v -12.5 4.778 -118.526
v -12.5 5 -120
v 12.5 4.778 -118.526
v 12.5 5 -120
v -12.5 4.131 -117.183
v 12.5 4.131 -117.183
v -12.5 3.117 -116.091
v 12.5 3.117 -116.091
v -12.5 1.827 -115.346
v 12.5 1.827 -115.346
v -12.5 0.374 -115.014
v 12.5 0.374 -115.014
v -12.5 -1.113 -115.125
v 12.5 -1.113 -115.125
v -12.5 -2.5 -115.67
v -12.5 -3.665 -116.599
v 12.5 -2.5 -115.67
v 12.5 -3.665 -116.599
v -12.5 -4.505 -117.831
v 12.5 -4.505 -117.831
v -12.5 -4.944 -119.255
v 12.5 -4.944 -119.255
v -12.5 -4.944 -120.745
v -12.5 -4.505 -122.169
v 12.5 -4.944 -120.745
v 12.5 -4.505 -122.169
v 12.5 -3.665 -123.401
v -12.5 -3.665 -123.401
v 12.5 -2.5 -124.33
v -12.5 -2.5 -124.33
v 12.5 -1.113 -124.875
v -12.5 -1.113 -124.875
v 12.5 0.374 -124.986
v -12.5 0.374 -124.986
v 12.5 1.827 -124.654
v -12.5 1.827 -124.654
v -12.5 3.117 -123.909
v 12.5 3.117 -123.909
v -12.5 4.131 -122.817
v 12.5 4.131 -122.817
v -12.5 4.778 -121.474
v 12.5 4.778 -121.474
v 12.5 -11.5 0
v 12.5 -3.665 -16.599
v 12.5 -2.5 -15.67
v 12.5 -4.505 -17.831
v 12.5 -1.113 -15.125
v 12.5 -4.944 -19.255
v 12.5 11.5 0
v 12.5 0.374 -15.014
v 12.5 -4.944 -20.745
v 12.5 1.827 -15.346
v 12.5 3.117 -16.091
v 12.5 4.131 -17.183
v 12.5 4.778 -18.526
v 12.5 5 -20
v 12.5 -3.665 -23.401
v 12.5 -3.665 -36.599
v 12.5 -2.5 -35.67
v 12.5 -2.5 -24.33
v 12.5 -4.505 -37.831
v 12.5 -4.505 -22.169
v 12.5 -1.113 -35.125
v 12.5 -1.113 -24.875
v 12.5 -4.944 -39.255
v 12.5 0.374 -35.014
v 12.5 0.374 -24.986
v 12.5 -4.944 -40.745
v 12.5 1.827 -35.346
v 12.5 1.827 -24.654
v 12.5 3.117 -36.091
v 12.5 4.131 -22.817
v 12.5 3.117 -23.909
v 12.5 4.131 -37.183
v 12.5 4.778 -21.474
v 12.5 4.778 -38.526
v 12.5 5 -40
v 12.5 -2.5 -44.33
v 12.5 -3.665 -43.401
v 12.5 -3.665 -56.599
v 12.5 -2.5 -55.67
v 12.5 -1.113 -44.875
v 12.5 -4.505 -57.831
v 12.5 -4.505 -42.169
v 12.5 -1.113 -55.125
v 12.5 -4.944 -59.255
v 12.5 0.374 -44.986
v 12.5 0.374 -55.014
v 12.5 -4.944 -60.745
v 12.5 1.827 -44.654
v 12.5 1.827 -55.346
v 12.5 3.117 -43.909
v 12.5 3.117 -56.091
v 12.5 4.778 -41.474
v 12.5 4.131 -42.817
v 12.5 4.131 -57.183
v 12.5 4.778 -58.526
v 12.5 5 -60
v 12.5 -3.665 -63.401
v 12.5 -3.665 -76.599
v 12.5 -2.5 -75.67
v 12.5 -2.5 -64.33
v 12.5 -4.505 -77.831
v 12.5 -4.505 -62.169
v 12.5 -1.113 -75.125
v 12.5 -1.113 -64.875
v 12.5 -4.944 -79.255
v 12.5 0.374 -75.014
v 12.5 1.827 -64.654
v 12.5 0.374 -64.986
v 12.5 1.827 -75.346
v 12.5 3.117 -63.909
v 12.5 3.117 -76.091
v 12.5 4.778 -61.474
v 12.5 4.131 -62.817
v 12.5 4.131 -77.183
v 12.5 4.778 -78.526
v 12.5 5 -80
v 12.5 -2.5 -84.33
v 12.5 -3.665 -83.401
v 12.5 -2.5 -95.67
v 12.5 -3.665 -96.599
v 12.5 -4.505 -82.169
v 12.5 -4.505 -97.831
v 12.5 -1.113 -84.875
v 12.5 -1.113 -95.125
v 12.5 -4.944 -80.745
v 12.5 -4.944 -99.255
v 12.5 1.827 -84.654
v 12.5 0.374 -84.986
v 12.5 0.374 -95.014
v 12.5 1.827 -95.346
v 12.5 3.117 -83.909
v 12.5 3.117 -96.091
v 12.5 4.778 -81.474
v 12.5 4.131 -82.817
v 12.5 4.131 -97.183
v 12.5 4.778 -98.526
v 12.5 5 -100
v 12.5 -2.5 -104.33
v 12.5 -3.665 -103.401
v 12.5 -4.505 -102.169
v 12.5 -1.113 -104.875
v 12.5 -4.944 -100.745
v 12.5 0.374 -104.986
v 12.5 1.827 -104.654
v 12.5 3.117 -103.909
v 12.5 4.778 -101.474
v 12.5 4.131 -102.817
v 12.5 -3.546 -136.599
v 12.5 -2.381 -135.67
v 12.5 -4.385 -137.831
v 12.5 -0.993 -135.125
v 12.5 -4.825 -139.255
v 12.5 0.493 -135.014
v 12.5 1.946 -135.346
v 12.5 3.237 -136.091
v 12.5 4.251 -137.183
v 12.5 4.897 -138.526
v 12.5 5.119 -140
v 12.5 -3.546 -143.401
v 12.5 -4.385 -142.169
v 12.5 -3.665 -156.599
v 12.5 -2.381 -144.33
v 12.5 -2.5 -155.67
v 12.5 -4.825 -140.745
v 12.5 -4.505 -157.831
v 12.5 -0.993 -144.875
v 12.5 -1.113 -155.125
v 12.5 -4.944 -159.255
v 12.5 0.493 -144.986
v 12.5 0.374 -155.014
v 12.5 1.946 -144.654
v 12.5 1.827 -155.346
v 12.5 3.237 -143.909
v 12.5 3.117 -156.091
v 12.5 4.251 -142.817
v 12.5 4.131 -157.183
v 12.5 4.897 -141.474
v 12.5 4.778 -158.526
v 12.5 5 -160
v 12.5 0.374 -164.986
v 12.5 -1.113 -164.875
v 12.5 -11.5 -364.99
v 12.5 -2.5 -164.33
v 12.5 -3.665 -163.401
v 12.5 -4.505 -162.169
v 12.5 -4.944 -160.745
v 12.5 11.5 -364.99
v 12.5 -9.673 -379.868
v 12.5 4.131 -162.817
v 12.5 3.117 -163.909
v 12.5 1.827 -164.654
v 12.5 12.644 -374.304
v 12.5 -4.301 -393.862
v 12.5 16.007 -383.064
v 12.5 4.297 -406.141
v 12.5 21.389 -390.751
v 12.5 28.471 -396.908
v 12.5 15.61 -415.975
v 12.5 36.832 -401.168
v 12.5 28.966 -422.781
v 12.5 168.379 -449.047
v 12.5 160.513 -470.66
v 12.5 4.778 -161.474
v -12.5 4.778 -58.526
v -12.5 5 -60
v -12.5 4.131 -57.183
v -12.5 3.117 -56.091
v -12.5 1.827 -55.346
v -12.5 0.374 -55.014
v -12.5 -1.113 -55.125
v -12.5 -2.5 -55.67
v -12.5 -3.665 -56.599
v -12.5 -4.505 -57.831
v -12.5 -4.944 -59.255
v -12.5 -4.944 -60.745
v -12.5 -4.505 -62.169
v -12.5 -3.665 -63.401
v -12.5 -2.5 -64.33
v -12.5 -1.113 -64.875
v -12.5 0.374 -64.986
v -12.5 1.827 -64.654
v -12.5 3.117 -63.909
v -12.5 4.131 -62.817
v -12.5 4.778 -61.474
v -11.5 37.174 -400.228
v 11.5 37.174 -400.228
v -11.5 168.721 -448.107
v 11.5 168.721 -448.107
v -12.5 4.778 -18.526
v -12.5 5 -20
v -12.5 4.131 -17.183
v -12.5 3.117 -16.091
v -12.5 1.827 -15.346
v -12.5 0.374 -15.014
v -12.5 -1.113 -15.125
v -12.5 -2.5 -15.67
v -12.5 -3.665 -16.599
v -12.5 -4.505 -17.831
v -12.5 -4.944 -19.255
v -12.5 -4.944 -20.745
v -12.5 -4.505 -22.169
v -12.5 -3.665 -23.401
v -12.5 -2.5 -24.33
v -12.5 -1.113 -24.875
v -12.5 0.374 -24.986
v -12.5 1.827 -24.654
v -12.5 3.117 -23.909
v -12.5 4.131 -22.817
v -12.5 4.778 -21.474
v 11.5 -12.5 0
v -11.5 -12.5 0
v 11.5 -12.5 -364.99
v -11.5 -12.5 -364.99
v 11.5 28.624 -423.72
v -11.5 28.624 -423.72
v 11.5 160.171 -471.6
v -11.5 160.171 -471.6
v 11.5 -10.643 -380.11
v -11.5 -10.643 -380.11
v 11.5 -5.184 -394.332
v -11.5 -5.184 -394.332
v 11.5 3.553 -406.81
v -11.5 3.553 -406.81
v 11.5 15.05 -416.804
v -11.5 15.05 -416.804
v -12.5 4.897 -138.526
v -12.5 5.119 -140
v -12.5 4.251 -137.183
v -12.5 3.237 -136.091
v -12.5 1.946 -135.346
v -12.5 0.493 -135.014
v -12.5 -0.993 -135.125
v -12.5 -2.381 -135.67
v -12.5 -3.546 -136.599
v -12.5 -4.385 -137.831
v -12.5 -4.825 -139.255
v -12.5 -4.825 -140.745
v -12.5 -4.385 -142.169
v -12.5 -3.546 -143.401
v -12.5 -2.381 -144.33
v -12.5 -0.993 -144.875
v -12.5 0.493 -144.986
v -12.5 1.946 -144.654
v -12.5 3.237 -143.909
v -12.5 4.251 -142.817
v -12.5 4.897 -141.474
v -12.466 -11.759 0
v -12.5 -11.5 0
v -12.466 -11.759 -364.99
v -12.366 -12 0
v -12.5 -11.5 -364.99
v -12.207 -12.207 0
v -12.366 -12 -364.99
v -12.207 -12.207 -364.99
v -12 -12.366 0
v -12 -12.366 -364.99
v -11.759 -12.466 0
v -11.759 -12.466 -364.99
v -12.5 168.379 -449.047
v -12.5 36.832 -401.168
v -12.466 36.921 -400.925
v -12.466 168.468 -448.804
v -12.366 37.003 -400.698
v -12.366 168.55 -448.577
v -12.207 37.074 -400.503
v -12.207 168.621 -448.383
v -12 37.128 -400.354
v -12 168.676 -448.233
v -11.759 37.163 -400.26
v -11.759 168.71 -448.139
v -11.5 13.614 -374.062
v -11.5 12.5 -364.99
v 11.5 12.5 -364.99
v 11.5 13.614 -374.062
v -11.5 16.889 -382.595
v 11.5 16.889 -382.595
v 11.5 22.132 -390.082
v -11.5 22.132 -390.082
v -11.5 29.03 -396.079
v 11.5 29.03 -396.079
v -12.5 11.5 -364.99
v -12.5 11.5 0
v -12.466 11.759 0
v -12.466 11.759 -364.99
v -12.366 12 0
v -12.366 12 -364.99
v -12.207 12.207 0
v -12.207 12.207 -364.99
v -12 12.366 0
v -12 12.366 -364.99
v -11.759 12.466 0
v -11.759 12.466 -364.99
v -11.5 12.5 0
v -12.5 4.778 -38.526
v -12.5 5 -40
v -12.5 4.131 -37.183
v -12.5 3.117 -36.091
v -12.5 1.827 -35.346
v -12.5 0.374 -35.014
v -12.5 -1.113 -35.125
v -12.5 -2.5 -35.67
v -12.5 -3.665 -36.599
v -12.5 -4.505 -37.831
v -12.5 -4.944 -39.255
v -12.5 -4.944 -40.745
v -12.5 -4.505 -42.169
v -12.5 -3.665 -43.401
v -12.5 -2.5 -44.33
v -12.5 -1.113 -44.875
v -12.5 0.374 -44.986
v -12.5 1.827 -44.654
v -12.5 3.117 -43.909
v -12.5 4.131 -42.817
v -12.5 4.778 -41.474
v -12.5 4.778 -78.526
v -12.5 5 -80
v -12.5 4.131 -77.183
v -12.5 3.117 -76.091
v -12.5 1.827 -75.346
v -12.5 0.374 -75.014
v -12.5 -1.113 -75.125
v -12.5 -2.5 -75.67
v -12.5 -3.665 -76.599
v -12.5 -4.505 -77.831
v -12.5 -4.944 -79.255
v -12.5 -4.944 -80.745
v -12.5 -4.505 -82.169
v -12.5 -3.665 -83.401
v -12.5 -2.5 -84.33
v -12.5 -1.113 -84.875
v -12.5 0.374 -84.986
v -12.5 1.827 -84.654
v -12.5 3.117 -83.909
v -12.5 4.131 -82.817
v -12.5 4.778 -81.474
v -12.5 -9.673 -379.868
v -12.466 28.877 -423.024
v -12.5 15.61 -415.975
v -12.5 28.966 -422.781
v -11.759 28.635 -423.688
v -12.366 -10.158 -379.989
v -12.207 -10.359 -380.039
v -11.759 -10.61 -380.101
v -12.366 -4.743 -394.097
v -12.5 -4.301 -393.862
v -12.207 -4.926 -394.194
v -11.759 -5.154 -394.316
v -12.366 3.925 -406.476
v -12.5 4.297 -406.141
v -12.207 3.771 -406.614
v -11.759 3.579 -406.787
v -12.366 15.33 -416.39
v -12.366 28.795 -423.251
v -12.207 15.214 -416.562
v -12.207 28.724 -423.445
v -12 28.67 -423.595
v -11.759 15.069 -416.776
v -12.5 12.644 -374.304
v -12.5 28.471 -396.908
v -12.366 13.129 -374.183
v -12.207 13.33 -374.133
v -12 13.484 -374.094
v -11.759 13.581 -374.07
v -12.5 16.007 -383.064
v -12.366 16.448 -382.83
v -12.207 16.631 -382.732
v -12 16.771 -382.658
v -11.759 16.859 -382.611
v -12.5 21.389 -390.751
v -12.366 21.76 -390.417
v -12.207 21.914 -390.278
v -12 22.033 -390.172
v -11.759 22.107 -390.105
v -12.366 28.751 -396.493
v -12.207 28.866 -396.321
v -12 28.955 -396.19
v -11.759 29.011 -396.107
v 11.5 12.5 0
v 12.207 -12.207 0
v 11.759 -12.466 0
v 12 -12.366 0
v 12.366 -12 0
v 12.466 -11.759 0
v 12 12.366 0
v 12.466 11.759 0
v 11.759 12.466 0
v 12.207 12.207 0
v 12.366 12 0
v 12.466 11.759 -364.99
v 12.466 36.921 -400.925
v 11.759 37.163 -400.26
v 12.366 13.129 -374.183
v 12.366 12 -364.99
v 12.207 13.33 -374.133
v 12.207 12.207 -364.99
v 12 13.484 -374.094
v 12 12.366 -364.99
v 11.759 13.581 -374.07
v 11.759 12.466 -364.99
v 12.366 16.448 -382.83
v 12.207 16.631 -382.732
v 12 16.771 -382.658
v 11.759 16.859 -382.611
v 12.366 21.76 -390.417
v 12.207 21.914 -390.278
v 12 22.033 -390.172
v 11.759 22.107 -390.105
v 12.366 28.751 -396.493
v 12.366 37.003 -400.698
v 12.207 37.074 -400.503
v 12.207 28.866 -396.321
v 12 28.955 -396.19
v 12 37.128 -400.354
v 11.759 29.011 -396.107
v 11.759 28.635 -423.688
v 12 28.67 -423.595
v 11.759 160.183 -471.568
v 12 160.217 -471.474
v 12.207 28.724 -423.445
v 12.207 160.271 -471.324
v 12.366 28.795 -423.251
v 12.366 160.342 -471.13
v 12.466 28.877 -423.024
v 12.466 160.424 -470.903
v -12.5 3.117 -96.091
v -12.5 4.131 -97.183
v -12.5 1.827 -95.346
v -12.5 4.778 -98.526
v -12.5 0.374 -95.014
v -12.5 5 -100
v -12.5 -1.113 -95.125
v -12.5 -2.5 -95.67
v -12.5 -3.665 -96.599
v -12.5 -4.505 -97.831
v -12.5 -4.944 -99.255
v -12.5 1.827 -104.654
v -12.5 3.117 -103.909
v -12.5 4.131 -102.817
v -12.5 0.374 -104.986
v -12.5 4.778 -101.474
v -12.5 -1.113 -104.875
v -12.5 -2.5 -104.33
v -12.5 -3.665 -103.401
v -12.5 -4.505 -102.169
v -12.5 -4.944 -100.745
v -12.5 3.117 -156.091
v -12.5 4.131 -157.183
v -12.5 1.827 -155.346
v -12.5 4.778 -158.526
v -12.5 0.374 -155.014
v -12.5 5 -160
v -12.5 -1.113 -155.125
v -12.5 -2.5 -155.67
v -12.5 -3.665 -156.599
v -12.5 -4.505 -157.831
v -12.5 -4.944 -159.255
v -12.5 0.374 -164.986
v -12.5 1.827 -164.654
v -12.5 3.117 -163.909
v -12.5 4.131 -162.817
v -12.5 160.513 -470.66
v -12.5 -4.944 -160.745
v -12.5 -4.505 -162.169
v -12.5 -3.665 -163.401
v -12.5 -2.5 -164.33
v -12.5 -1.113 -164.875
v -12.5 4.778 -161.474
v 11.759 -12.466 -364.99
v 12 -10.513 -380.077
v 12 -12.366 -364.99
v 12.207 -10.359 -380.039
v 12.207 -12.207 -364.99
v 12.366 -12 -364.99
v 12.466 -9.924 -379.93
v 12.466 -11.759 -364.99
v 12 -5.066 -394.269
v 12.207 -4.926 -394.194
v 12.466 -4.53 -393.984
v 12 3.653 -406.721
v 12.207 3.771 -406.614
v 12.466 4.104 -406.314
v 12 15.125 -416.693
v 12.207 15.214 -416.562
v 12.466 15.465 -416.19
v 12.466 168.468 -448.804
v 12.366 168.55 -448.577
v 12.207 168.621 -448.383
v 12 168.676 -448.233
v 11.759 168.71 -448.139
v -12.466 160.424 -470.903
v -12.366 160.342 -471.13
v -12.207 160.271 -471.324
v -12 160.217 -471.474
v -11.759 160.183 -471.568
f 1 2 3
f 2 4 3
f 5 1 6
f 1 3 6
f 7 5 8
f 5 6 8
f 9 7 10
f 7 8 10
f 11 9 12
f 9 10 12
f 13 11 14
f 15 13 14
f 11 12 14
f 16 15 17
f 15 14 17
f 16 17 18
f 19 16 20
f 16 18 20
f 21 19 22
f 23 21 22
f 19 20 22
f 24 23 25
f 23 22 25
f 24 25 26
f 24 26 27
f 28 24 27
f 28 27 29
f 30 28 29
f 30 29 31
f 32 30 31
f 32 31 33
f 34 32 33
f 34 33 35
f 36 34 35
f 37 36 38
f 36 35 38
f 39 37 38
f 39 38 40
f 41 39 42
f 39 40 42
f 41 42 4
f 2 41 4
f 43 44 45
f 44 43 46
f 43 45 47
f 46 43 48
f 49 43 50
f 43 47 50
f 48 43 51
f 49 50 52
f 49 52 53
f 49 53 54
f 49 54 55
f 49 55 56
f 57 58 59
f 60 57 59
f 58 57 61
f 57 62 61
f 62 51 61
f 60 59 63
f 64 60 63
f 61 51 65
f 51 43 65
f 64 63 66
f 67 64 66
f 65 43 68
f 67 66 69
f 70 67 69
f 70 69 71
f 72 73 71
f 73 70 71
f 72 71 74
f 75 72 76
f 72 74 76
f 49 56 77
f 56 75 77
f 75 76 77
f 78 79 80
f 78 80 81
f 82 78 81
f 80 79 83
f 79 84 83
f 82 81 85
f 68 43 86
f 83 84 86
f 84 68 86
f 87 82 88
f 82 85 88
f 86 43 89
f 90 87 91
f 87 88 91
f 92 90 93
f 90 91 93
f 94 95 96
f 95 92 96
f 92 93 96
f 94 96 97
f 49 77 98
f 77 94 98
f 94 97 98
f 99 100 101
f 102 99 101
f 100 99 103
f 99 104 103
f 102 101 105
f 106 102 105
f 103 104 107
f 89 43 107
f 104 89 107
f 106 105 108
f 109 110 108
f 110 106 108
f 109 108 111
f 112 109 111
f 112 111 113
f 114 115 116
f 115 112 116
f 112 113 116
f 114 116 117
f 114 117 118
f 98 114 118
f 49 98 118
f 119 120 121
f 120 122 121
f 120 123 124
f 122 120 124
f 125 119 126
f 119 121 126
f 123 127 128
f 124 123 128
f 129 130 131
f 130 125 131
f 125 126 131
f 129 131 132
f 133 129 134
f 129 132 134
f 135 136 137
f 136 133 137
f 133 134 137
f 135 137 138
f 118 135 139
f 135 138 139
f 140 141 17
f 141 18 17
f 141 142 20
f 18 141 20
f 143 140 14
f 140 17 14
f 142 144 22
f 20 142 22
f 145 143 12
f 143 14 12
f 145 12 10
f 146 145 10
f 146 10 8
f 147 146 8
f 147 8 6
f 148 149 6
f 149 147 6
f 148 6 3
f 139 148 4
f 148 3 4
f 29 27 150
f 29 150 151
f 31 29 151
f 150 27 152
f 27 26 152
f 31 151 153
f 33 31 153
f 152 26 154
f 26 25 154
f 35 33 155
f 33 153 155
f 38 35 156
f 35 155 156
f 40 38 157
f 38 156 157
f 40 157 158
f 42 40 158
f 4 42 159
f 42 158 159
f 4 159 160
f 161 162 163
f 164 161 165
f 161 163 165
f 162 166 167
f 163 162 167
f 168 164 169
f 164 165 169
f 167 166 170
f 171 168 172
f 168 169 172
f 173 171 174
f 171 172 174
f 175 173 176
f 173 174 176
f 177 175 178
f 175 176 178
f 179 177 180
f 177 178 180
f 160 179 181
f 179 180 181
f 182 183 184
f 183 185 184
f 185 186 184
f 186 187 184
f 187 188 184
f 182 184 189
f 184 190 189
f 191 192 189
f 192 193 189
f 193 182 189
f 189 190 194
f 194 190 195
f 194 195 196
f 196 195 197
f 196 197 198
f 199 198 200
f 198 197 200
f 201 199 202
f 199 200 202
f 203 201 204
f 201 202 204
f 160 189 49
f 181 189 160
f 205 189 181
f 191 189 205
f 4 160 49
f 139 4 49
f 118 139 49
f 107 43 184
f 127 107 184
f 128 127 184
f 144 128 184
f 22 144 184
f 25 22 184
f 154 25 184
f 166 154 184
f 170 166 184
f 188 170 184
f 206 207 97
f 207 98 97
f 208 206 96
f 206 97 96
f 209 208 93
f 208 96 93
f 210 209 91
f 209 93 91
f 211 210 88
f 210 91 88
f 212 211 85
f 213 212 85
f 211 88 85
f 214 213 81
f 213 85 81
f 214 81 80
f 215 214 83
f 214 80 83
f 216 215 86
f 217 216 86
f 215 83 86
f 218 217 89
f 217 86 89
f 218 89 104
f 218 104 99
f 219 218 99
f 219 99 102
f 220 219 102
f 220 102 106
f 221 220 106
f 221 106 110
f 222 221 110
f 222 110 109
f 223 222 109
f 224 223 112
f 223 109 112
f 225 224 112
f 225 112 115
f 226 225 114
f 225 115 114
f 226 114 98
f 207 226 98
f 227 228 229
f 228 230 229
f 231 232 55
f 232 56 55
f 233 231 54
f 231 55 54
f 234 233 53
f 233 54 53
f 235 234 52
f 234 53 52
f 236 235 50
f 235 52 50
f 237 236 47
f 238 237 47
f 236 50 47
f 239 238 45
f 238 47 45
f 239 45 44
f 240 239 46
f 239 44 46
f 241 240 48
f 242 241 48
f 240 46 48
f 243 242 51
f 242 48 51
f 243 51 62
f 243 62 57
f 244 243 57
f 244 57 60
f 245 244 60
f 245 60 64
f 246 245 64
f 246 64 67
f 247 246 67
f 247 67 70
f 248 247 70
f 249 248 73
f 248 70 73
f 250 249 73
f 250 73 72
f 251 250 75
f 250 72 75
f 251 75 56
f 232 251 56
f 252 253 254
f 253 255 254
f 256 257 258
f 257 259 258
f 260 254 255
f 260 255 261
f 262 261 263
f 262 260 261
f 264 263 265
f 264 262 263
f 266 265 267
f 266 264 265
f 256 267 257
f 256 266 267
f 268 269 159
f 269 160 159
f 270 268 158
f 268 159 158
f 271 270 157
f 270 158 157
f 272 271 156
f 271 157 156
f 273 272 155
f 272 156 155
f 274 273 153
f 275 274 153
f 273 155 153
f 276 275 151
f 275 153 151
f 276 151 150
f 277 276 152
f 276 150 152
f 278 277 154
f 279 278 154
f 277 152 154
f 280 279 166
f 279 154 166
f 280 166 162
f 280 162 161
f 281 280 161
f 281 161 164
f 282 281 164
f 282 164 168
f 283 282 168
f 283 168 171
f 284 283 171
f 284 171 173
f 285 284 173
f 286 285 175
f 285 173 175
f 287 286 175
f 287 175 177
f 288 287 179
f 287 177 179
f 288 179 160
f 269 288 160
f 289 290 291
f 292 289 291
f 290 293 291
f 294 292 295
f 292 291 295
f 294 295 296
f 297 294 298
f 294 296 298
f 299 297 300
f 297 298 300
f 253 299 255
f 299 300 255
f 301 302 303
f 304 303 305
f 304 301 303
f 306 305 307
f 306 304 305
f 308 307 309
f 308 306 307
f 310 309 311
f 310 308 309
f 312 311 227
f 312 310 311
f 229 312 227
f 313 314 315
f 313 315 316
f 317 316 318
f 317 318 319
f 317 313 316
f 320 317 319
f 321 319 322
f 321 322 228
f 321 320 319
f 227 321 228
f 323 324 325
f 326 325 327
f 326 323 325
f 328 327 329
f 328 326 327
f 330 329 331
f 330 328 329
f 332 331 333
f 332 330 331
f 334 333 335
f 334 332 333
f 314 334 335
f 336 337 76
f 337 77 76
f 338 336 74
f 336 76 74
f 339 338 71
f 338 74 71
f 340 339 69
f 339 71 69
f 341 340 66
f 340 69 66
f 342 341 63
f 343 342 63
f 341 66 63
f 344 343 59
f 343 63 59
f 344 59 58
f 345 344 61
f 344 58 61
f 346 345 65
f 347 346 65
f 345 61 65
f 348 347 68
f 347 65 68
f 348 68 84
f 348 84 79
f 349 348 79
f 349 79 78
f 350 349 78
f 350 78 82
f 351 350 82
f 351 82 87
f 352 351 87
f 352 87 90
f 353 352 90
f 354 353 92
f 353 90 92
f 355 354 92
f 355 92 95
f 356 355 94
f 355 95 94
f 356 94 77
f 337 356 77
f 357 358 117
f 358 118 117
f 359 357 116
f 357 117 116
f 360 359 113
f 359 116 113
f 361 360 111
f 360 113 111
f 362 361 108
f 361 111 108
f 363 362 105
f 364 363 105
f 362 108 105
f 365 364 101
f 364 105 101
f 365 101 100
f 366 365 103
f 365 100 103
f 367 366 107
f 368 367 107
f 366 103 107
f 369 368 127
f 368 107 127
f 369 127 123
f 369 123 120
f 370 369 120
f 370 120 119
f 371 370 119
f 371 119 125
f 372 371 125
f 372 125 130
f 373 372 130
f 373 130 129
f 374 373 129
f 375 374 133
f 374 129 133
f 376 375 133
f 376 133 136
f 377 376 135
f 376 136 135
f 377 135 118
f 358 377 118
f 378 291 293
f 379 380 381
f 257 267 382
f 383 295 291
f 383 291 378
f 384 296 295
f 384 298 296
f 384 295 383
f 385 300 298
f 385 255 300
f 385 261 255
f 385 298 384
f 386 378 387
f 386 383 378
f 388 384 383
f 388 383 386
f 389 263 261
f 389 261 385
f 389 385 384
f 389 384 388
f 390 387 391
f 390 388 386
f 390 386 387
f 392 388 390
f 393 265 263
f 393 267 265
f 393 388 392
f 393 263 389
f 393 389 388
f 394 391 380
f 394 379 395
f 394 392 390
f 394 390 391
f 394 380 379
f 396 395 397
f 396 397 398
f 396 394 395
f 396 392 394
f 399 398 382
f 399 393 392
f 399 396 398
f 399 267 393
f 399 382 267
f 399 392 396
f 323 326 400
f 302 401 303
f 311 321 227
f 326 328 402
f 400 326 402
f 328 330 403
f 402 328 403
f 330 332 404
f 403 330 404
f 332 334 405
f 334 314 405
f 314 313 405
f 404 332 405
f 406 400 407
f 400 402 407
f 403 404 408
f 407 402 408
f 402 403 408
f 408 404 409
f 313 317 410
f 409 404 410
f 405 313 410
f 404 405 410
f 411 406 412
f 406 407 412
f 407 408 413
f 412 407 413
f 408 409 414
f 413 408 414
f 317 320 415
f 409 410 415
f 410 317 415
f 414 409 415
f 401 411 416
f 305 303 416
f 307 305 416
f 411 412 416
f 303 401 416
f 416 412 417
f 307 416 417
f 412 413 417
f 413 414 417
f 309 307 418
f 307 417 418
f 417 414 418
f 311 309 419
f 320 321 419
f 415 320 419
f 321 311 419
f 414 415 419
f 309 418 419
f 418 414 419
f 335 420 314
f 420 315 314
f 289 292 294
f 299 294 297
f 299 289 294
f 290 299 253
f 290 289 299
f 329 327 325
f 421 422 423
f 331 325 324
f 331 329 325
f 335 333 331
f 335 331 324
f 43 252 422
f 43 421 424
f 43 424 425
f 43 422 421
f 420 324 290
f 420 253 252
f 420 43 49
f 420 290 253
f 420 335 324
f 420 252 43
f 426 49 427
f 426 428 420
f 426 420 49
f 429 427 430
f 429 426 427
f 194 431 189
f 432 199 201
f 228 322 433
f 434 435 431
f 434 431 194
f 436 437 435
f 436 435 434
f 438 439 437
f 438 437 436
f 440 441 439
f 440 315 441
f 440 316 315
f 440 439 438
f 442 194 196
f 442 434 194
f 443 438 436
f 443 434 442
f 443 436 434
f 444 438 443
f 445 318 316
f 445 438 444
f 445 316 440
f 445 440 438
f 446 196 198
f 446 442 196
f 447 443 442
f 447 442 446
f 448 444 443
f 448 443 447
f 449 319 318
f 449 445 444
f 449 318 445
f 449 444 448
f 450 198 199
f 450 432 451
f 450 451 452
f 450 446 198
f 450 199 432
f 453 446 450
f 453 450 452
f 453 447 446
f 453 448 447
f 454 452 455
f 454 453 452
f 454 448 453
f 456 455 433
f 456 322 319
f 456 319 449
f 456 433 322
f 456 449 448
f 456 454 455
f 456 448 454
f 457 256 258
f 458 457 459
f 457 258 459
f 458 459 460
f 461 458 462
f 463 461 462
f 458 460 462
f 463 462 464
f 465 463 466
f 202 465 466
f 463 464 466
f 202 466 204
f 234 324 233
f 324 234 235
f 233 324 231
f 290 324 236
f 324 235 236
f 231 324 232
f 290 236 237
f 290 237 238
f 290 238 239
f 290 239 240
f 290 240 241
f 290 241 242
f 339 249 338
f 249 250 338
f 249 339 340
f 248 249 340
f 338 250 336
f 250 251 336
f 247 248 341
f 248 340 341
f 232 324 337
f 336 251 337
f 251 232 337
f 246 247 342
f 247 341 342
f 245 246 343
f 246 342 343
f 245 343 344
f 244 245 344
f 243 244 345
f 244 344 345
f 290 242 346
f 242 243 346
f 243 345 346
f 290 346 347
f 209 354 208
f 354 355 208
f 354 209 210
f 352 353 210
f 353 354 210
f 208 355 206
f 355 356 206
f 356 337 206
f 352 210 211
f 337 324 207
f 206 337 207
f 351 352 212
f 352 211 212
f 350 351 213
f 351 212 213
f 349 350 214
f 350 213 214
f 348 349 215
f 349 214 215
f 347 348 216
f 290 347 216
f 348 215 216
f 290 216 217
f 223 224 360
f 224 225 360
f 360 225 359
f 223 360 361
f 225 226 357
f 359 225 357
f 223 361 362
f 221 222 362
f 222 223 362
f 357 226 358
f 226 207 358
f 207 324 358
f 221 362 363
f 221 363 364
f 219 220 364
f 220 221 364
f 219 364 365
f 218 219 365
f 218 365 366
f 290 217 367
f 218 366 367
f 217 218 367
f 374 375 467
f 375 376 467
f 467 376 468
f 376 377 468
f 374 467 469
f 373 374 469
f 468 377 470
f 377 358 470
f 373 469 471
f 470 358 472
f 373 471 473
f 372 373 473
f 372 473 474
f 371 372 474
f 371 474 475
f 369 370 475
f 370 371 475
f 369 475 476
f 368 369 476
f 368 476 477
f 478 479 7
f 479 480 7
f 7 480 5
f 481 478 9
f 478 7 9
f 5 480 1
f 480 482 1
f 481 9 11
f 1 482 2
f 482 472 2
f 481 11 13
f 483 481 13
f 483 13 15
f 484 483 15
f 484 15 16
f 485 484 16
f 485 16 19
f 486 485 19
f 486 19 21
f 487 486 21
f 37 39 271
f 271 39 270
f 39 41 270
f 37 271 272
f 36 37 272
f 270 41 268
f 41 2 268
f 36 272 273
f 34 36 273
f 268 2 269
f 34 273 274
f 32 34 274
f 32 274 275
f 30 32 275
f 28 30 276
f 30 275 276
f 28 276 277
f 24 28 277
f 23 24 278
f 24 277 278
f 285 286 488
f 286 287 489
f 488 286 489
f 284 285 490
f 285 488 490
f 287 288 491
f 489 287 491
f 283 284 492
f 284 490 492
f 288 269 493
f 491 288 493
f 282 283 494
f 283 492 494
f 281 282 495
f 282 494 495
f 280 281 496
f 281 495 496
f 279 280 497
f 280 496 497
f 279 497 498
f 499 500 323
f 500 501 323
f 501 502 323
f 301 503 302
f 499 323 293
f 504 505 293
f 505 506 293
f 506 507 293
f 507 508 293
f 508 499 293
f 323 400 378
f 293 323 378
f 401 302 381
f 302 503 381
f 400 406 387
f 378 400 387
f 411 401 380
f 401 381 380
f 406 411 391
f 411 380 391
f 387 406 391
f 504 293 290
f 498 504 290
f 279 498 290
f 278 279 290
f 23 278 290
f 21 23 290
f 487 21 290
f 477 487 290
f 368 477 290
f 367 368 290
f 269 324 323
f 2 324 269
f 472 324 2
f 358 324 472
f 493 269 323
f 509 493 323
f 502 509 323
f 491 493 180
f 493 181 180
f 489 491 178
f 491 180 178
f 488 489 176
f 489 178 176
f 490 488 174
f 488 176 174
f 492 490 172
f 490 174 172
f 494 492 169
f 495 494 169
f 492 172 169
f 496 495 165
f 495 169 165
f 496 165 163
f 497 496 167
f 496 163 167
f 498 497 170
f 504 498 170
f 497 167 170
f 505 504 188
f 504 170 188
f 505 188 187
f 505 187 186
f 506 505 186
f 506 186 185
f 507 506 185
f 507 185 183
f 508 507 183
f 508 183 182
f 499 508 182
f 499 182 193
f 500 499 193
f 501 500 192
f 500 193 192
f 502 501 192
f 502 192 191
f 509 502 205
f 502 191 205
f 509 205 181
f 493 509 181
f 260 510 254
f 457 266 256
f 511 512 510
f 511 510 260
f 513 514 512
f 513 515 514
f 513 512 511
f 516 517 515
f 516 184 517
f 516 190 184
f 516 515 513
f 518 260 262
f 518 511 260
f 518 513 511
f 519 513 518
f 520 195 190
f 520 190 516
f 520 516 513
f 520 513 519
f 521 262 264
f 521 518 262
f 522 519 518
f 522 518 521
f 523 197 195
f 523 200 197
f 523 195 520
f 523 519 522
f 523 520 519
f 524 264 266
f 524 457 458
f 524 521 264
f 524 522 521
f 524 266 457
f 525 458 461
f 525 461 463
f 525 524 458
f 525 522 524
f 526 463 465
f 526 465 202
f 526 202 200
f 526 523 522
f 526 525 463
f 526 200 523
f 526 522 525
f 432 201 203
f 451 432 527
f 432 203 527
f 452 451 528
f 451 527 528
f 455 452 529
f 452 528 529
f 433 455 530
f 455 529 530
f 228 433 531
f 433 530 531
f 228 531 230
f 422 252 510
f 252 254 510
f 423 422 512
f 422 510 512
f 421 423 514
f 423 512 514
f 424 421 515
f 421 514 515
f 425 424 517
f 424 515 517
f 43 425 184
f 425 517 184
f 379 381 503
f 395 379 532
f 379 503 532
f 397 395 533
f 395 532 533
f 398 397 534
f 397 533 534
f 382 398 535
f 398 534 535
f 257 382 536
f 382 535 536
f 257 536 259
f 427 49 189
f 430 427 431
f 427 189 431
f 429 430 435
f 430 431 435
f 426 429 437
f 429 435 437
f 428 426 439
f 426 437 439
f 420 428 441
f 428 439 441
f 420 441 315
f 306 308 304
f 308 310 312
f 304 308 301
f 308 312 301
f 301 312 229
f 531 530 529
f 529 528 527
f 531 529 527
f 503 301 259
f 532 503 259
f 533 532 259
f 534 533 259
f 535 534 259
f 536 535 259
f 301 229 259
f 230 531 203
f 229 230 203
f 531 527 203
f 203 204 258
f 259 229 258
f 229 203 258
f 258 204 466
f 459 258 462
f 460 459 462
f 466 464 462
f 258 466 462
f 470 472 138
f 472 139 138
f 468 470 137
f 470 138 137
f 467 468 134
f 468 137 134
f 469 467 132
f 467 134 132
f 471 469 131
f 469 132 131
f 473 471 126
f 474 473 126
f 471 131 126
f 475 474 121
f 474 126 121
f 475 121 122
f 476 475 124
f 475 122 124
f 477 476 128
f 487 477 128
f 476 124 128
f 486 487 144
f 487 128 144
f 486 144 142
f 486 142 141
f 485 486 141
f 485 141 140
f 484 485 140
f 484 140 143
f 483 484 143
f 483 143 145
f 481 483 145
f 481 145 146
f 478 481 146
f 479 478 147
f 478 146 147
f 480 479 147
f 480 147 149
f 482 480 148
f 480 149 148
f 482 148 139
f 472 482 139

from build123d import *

# Parameters (mm, degrees)
F0_W          = 25
F0_H          = 25
F3_R          = 1
F4_R          = 5
F5_DEPTH      = 12.5010001
F5_DEPTH_BACK = 12.5010001


with BuildPart() as f2:
    # F2: sweep along a path in F1
    with BuildLine(Plane.YZ) as f2_path:
        Line((0, 0), (0, -364.9896230895))
        ThreePointArc((0, -364.9896230895), (9.0423977856, -393.6684449071), (32.8989928337, -411.9742541288))
        Line((32.8989928337, -411.9742541288), (164.4462086375, -459.853525082))
    # F0 (on Top) → F2 (sweep)
    with BuildSketch(Plane.XY):
        Rectangle(F0_W, F0_H)
    sweep(path=f2_path.line)

    # F3
    f3_edges = [f2.edges().sort_by_distance(p)[0] for p in [
        (12.5, -12.5, -182.494812),
        (12.5, -1.197003, -400.83815),
        (-12.5, 94.397349, -447.660047),
        (12.5, 102.947853, -424.167732),
        (-12.5, 102.947853, -424.167732),
    ]]
    fillet(f3_edges, radius=F3_R)

    # F4 (on Right) → F5 (cut, two sides)
    with BuildSketch(Plane.YZ) as f5_sk:
        with Locations((0, -20)):
            Circle(F4_R)
        with Locations((0, -40)):
            Circle(F4_R)
        with Locations((0, -60)):
            Circle(F4_R)
        with Locations((0, -80)):
            Circle(F4_R)
        with Locations((0, -100)):
            Circle(F4_R)
        with Locations((0, -120)):
            Circle(F4_R)
        with Locations((0.1194545839, -140)):
            Circle(F4_R)
        with Locations((0, -160)):
            Circle(F4_R)
    extrude(amount=-F5_DEPTH, mode=Mode.SUBTRACT)
    extrude(f5_sk.sketch, amount=F5_DEPTH_BACK, mode=Mode.SUBTRACT)


solid = f2.part
